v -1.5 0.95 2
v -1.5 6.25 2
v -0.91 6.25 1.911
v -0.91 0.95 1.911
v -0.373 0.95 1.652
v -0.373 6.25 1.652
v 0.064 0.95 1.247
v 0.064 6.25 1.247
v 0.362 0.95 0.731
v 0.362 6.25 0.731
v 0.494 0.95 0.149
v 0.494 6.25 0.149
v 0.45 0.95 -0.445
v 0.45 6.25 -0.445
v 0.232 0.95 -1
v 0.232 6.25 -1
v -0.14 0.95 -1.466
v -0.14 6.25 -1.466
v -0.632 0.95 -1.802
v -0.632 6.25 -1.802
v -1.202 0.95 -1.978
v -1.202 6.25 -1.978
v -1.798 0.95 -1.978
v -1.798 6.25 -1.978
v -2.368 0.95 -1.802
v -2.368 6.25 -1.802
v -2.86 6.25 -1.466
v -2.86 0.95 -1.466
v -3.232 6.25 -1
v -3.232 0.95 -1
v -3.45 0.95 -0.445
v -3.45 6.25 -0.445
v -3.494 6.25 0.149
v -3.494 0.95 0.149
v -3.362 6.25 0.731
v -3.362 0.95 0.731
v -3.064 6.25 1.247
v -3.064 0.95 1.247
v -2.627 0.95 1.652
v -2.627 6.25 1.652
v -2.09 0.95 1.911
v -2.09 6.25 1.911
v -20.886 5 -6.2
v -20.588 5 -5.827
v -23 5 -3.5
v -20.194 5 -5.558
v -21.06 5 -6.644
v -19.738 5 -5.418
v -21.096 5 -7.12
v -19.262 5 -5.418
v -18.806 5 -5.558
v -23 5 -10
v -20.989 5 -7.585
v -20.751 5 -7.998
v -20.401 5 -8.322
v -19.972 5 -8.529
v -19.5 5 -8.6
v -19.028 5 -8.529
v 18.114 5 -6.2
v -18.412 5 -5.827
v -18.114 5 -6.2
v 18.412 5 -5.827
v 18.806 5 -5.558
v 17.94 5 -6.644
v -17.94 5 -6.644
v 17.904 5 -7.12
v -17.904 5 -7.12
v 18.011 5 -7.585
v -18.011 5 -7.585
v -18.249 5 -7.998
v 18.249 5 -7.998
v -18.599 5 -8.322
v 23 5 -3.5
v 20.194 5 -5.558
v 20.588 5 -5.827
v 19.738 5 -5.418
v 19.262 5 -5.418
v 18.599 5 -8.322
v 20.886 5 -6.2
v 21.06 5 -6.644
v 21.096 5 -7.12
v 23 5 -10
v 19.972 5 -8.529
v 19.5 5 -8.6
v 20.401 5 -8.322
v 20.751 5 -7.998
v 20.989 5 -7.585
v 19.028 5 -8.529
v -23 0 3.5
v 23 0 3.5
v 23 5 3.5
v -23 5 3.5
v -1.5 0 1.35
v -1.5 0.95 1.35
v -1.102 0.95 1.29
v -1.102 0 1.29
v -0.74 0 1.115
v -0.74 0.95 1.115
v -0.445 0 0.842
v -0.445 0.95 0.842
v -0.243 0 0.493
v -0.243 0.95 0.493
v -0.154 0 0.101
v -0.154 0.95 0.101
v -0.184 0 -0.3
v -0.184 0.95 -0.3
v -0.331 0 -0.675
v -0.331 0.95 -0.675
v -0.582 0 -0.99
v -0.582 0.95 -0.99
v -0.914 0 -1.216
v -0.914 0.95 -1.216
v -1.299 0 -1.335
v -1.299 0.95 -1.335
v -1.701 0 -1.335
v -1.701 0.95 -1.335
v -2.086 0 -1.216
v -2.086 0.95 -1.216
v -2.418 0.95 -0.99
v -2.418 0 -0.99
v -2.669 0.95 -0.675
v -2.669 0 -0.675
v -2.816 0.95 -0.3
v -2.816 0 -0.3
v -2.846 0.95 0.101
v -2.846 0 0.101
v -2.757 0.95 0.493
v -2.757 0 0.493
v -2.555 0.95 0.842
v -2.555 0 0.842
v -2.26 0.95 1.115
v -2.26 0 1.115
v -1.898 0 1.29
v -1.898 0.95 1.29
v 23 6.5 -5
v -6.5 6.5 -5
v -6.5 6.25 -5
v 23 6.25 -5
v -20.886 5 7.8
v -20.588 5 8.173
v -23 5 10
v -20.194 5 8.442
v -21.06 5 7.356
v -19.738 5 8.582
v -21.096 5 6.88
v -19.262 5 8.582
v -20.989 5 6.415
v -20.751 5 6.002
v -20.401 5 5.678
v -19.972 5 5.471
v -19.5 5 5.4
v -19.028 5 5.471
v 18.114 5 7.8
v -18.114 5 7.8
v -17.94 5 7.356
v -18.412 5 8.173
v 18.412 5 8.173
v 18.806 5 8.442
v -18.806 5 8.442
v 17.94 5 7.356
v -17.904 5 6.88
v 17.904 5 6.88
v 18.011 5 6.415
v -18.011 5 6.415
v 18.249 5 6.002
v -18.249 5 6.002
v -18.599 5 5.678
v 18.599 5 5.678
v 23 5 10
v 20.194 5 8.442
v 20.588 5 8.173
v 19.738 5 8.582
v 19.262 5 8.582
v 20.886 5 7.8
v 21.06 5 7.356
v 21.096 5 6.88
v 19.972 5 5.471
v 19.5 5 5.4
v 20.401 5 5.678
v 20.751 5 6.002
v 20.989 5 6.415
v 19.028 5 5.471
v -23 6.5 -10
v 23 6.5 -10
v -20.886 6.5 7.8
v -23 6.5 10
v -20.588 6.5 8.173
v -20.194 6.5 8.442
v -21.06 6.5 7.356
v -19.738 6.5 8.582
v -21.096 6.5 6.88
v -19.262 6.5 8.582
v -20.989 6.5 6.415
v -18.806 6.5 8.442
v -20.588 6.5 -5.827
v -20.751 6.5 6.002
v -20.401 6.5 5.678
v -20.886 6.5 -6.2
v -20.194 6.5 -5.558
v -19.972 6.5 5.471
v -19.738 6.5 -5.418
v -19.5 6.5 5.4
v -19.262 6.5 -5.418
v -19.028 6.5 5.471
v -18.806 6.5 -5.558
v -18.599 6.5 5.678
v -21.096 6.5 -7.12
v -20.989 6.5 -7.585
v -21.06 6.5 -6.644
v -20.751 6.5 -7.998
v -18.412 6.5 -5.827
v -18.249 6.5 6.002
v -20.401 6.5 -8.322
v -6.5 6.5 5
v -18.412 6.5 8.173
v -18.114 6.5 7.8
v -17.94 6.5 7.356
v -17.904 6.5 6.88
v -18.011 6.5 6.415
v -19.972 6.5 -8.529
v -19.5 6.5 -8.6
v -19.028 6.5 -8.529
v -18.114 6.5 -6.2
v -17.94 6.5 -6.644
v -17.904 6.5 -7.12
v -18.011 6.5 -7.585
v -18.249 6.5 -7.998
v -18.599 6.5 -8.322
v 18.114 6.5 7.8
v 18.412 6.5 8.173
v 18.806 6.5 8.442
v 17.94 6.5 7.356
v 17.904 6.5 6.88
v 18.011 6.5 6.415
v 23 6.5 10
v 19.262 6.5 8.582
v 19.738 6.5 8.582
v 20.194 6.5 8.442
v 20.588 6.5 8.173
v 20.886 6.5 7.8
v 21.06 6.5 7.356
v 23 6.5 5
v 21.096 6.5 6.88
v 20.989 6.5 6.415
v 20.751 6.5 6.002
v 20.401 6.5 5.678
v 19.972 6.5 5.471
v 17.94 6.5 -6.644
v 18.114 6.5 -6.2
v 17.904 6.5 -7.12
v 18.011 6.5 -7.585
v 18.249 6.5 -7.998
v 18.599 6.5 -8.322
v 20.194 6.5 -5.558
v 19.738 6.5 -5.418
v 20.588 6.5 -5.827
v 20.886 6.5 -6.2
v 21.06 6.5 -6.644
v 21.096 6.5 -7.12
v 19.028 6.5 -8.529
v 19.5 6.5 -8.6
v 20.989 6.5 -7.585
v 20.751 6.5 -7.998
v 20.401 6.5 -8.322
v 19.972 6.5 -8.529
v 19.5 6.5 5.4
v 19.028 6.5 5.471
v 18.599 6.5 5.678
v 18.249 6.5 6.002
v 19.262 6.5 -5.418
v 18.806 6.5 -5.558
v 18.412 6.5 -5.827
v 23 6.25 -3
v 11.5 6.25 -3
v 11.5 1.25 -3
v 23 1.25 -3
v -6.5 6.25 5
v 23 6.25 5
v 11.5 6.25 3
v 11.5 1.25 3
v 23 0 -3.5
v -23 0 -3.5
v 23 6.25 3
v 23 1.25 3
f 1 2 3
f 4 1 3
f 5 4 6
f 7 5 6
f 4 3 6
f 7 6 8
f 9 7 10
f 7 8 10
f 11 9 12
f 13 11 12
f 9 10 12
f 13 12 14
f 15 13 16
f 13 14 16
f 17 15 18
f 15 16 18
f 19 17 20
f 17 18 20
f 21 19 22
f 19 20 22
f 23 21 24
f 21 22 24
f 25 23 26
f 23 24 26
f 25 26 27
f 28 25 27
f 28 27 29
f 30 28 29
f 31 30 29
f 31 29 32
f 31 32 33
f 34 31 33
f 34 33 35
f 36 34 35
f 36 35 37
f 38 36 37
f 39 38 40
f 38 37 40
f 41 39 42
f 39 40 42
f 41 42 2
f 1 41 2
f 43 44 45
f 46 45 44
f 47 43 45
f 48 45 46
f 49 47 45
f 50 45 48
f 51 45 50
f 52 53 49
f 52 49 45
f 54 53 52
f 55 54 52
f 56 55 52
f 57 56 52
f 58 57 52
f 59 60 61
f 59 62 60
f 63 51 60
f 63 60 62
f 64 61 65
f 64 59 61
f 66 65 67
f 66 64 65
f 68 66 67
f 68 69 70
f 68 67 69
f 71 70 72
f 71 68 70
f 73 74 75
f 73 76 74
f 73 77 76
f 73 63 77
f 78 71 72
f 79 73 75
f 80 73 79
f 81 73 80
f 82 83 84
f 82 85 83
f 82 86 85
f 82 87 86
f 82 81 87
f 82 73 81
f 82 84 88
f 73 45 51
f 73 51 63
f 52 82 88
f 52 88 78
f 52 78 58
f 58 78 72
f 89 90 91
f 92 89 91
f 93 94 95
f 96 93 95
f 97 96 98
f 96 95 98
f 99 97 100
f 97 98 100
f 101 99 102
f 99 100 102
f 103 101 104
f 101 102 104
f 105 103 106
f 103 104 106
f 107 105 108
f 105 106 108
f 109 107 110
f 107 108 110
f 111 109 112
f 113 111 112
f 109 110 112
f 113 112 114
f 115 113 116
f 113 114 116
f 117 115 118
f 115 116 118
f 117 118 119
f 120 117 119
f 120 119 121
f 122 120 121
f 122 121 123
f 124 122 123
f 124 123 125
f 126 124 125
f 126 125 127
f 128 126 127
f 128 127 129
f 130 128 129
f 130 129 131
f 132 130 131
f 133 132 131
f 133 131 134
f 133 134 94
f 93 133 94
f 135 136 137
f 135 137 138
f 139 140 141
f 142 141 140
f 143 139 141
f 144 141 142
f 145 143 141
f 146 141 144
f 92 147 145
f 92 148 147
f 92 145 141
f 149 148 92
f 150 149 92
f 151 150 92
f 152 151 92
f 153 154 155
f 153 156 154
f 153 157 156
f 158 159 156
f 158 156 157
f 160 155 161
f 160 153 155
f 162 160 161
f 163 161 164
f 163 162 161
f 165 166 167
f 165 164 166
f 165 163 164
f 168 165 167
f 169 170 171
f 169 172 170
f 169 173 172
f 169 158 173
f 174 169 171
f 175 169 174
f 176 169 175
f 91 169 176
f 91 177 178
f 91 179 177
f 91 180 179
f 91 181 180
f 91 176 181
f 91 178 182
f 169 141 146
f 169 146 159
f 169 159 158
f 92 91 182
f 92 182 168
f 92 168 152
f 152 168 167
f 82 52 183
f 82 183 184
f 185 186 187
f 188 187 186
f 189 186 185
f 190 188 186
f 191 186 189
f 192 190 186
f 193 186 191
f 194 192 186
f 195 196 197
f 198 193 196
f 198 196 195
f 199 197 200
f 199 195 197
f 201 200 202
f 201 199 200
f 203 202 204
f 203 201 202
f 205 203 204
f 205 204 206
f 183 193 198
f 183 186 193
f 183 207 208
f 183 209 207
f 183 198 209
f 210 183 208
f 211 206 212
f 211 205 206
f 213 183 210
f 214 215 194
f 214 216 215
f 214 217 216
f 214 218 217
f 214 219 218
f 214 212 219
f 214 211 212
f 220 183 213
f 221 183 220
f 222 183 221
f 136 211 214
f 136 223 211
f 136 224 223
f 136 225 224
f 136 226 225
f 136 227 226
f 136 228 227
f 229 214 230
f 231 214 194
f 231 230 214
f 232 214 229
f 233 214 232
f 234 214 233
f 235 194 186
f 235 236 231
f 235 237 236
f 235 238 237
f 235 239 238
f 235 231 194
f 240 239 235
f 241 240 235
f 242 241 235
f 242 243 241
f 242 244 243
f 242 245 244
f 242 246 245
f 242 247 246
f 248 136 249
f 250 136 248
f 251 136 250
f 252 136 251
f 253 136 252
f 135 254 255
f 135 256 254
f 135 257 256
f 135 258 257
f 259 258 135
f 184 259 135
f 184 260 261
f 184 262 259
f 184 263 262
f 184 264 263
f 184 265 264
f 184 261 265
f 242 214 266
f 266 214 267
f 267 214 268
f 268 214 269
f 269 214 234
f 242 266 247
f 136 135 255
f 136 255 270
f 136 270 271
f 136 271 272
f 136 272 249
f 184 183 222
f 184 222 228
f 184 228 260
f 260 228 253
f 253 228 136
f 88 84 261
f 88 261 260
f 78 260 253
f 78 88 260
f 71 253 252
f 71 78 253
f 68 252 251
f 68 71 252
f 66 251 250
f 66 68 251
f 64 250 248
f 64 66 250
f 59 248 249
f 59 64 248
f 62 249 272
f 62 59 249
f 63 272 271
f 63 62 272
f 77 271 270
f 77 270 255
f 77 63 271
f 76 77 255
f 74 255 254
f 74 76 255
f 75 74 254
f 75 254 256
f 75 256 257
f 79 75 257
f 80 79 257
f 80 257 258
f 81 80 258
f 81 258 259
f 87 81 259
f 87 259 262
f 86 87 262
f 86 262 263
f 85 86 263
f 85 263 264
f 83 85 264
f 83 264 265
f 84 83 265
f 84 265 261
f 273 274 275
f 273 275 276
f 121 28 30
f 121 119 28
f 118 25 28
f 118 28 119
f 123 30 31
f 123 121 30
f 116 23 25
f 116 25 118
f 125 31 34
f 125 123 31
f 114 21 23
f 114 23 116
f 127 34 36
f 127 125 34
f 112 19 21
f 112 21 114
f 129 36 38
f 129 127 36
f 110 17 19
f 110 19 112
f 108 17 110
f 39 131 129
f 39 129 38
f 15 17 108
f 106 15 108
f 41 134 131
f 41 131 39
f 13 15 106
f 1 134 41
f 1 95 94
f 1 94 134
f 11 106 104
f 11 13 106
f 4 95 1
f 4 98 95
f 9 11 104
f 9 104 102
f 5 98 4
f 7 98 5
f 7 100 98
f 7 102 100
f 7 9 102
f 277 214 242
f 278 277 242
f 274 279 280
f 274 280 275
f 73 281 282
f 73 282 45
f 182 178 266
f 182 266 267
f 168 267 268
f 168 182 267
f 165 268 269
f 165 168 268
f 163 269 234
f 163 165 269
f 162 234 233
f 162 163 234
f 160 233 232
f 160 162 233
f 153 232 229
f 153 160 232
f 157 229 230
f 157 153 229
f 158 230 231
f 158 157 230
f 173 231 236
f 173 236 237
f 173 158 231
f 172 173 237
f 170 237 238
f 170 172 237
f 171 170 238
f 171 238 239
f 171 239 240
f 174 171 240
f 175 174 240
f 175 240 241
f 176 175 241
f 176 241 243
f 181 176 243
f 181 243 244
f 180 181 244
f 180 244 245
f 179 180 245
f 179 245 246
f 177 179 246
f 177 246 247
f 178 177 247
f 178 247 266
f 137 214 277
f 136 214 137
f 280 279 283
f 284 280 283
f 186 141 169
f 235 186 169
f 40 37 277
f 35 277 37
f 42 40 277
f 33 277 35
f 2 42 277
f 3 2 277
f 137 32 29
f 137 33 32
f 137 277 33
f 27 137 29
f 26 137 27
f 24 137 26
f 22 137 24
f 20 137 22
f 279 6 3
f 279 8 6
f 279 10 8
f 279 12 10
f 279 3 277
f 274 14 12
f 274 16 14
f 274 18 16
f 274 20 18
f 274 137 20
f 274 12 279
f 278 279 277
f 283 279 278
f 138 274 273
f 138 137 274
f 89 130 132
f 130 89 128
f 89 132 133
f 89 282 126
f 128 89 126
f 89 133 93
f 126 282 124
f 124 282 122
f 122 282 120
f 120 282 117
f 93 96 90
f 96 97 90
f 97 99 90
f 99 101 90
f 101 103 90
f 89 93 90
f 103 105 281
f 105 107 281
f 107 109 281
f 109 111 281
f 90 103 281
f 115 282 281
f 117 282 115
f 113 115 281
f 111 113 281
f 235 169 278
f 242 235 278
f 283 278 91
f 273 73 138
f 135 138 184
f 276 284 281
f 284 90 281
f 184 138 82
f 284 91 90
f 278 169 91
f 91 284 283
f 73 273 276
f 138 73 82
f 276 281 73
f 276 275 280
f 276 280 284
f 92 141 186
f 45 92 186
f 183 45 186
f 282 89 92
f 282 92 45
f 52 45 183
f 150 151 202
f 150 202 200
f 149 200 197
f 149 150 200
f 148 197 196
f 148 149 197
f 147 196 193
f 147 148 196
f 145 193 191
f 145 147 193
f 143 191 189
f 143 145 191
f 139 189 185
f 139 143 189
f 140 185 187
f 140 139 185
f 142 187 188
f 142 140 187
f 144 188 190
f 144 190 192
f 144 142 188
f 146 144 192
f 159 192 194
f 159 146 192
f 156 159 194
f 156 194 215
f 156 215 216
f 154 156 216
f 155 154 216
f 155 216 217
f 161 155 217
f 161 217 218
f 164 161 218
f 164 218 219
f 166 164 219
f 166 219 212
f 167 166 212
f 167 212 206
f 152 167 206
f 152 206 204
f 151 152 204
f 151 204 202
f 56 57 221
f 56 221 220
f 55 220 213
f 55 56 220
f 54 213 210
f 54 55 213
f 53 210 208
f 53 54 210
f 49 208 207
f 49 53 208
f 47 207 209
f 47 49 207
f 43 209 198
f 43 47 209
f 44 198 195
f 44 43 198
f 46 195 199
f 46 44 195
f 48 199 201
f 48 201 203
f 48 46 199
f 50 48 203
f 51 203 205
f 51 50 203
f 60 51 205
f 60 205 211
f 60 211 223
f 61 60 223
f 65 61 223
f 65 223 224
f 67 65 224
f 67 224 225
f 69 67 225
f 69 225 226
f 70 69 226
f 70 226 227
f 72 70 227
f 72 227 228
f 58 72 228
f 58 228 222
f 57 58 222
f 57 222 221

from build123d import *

# Parameters (mm, degrees)
SKETCH_1_W          = 46
SKETCH_1_H          = 20
SKETCH_1_R          = 1.6
EXTRUDE_1_DEPTH     = 6.5
SKETCH_2_W          = 29.5
SKETCH_2_H          = 10
CUT_EXTRUDE_1_DEPTH = 0.25
SKETCH_3_R          = 2
CUT_EXTRUDE_2_DEPTH = 5.3
SKETCH_4_R          = 1.35
CUT_EXTRUDE_3_DEPTH = 1
SKETCH_5_W          = 11.5
SKETCH_5_H          = 6
CUT_EXTRUDE_4_DEPTH = 5
SKETCH_7_W          = 6.5
SKETCH_7_H          = 5
CUT_EXTRUDE_5_DEPTH = 48.521047968


with BuildPart() as part:
    # 草图1 → 凸台-拉伸1 (new body)
    with BuildSketch(Plane(origin=(0, 0, 0), x_dir=(1, 0, 0), z_dir=(0, 1, 0))):
        Rectangle(SKETCH_1_W, SKETCH_1_H)
        with Locations(Location((-19.5, 7, 0), (0, 0, 90))):
            Circle(SKETCH_1_R, mode=Mode.SUBTRACT)
        with Locations(Location((19.5, 7, 0), (0, 0, 90))):
            Circle(SKETCH_1_R, mode=Mode.SUBTRACT)
        with Locations(Location((-19.5, -7, 0), (0, 0, 90))):
            Circle(SKETCH_1_R, mode=Mode.SUBTRACT)
        with Locations(Location((19.5, -7, 0), (0, 0, 90))):
            Circle(SKETCH_1_R, mode=Mode.SUBTRACT)
    extrude(amount=EXTRUDE_1_DEPTH)

    # 草图2 → 切除-拉伸1 (cut)
    with BuildSketch(Plane(origin=(0, 6.5, 0), x_dir=(1, 0, 0), z_dir=(0, 1, 0))):
        with Locations((8.25, 0)):
            Rectangle(SKETCH_2_W, SKETCH_2_H)
    extrude(amount=-CUT_EXTRUDE_1_DEPTH, mode=Mode.SUBTRACT)

    # 草图3 → 切除-拉伸2 (cut)
    with BuildSketch(Plane(origin=(0, 6.25, 0), x_dir=(1, 0, 0), z_dir=(0, 1, 0))):
        with Locations(Location((-1.5, 0, 0), (0, 0, 270))):
            Circle(SKETCH_3_R)
    extrude(amount=-CUT_EXTRUDE_2_DEPTH, mode=Mode.SUBTRACT)

    # 草图4 → 切除-拉伸3 (cut)
    with BuildSketch(Plane(origin=(0, 0.95, 0), x_dir=(1, 0, 0), z_dir=(0, 1, 0))):
        with Locations(Location((-1.5, 0, 0), (0, 0, 270))):
            Circle(SKETCH_4_R)
    extrude(amount=-CUT_EXTRUDE_3_DEPTH, mode=Mode.SUBTRACT)

    # 草图5 → 切除-拉伸4 (cut)
    with BuildSketch(Plane(origin=(0, 6.25, 0), x_dir=(1, 0, 0), z_dir=(0, 1, 0))):
        with Locations((17.25, 0)):
            Rectangle(SKETCH_5_W, SKETCH_5_H)
    extrude(amount=-CUT_EXTRUDE_4_DEPTH, mode=Mode.SUBTRACT)

    # 草图7 → 切除-拉伸5 (cut, through all)
    with BuildSketch(Plane(origin=(23, 0, 0), x_dir=(0, 0, -1), z_dir=(1, 0, 0))):
        with Locations((-6.75, 2.5)):
            Rectangle(SKETCH_7_W, SKETCH_7_H)
        with Locations((6.75, 2.5)):
            Rectangle(SKETCH_7_W, SKETCH_7_H)
    extrude(amount=-CUT_EXTRUDE_5_DEPTH, mode=Mode.SUBTRACT)


solid = part.part
